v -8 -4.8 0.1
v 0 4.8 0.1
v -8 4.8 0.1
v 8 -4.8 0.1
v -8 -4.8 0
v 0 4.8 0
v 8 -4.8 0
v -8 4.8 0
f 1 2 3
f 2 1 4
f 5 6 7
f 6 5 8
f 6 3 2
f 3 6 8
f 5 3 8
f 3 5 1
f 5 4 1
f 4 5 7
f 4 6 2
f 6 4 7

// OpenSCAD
// file: 164575b.scad
use <../lib.scad>
function ldraw_lib__164575b() = [
// 0 Sticker Train Front  2 x  6 Stripe Right
// 0 Name: 164575b.dat
// 0 Author: William Howard [WilliamH]
// 0 !LDRAW_ORG Part UPDATE 2014-02
// 0 !LICENSE Licensed under CC BY 2.0 and CC BY 4.0 : see CAreadme.txt
// 
// 0 BFC CERTIFY CCW
  [0,"BFC","CERTIFY"],
  [0,"BFC","CCW"],
// 
// 0 !HISTORY 2013-08-08 [MMR1988] Inlined Subpart and corrected dimensions
// 0 !HISTORY 2014-12-23 [PTadmin] Official Update 2014-02
// 
// 
// 4 15 -20 -0.25 -12 0 -0.25 -12 20 -0.25 12 -20 -0.25 12
  [4,15,-20,-0.25,-12,0,-0.25,-12,20,-0.25,12,-20,-0.25,12],
// 4 16 -20 0 12 20 0 12 0 0 -12 -20 0 -12
  [4,16,-20,0,12,20,0,12,0,0,-12,-20,0,-12],
// 4 16 -20 0 -12 0 0 -12 0 -0.25 -12 -20 -0.25 -12
  [4,16,-20,0,-12,0,0,-12,0,-0.25,-12,-20,-0.25,-12],
// 4 16 -20 0 12 -20 0 -12 -20 -0.25 -12 -20 -0.25 12
  [4,16,-20,0,12,-20,0,-12,-20,-0.25,-12,-20,-0.25,12],
// 4 16 -20 -0.25 12 20 -0.25 12 20 0 12 -20 0 12
  [4,16,-20,-0.25,12,20,-0.25,12,20,0,12,-20,0,12],
// 4 16 20 -0.25 12 0 -0.25 -12 0 0 -12 20 0 12
  [4,16,20,-0.25,12,0,-0.25,-12,0,0,-12,20,0,12],
];
module ldraw_lib__164575b(step=0, col=false, unit=2/5, alt=false, line=0.2, solid=!$preview)
    makepoly(ldraw_lib__164575b(), step=step, col=col, unit=unit, alt=alt, line=line, solid=solid);
ldraw_lib__164575b(line=0.2);
// file: 164575c.scad
use <../lib.scad>
use <164575b.scad>
function ldraw_lib__164575c() = [
// 0 Sticker Train Front  2 x  6 Stripe Left
// 0 Name: 164575c.dat
// 0 Author: William Howard [WilliamH]
// 0 !LDRAW_ORG Part UPDATE 2014-02
// 0 !LICENSE Licensed under CC BY 2.0 and CC BY 4.0 : see CAreadme.txt
// 
// 0 BFC CERTIFY CCW
  [0,"BFC","CERTIFY"],
  [0,"BFC","CCW"],
// 
// 0 !HISTORY 2013-08-08 [MMR1988] Inlined Subpart and corrected dimensions
// 0 !HISTORY 2014-12-23 [PTadmin] Official Update 2014-02
// 
// 
// 1 16 0 0 0 1 0 0 0 1 0 0 0 -1 164575b.dat
  [1,16,0,0,0,1,0,0,0,1,0,0,0,-1, ldraw_lib__164575b()],
];
module ldraw_lib__164575c(step=0, col=false, unit=2/5, alt=false, line=0.2, solid=!$preview)
    makepoly(ldraw_lib__164575c(), step=step, col=col, unit=unit, alt=alt, line=line, solid=solid);
ldraw_lib__164575c(line=0.2);
// main file
use <../lib.scad>
use <164575c.scad>
function ldraw_lib__164585b() = [
// 0 =Sticker Train Front  2 x  6 White Stripe Left
// 0 Name: 164585b.dat
// 0 Author: Gerald Lasser [GeraldLasser]
// 0 !LDRAW_ORG Part Alias UPDATE 2023-01
// 0 !LICENSE Licensed under CC BY 4.0 : see CAreadme.txt
// 
// 0 BFC CERTIFY CCW
  [0,"BFC","CERTIFY"],
  [0,"BFC","CCW"],
// 
// 0 !KEYWORDS Set 4536, Set 4543, Set 4546, set 4551
// 
// 0 !HISTORY 2023-03-05 [OrionP] Official Update 2023-01
// 
// 
// 1 16 0 0 0 1 0 0 0 1 0 0 0 1 164575c.dat
  [1,16,0,0,0,1,0,0,0,1,0,0,0,1, ldraw_lib__164575c()],
];
module ldraw_lib__164585b(step=0, col=false, unit=2/5, alt=false, line=0.2, solid=!$preview)
    makepoly(ldraw_lib__164585b(), step=step, col=col, unit=unit, alt=alt, line=line, solid=solid);
ldraw_lib__164585b(line=0.2);
